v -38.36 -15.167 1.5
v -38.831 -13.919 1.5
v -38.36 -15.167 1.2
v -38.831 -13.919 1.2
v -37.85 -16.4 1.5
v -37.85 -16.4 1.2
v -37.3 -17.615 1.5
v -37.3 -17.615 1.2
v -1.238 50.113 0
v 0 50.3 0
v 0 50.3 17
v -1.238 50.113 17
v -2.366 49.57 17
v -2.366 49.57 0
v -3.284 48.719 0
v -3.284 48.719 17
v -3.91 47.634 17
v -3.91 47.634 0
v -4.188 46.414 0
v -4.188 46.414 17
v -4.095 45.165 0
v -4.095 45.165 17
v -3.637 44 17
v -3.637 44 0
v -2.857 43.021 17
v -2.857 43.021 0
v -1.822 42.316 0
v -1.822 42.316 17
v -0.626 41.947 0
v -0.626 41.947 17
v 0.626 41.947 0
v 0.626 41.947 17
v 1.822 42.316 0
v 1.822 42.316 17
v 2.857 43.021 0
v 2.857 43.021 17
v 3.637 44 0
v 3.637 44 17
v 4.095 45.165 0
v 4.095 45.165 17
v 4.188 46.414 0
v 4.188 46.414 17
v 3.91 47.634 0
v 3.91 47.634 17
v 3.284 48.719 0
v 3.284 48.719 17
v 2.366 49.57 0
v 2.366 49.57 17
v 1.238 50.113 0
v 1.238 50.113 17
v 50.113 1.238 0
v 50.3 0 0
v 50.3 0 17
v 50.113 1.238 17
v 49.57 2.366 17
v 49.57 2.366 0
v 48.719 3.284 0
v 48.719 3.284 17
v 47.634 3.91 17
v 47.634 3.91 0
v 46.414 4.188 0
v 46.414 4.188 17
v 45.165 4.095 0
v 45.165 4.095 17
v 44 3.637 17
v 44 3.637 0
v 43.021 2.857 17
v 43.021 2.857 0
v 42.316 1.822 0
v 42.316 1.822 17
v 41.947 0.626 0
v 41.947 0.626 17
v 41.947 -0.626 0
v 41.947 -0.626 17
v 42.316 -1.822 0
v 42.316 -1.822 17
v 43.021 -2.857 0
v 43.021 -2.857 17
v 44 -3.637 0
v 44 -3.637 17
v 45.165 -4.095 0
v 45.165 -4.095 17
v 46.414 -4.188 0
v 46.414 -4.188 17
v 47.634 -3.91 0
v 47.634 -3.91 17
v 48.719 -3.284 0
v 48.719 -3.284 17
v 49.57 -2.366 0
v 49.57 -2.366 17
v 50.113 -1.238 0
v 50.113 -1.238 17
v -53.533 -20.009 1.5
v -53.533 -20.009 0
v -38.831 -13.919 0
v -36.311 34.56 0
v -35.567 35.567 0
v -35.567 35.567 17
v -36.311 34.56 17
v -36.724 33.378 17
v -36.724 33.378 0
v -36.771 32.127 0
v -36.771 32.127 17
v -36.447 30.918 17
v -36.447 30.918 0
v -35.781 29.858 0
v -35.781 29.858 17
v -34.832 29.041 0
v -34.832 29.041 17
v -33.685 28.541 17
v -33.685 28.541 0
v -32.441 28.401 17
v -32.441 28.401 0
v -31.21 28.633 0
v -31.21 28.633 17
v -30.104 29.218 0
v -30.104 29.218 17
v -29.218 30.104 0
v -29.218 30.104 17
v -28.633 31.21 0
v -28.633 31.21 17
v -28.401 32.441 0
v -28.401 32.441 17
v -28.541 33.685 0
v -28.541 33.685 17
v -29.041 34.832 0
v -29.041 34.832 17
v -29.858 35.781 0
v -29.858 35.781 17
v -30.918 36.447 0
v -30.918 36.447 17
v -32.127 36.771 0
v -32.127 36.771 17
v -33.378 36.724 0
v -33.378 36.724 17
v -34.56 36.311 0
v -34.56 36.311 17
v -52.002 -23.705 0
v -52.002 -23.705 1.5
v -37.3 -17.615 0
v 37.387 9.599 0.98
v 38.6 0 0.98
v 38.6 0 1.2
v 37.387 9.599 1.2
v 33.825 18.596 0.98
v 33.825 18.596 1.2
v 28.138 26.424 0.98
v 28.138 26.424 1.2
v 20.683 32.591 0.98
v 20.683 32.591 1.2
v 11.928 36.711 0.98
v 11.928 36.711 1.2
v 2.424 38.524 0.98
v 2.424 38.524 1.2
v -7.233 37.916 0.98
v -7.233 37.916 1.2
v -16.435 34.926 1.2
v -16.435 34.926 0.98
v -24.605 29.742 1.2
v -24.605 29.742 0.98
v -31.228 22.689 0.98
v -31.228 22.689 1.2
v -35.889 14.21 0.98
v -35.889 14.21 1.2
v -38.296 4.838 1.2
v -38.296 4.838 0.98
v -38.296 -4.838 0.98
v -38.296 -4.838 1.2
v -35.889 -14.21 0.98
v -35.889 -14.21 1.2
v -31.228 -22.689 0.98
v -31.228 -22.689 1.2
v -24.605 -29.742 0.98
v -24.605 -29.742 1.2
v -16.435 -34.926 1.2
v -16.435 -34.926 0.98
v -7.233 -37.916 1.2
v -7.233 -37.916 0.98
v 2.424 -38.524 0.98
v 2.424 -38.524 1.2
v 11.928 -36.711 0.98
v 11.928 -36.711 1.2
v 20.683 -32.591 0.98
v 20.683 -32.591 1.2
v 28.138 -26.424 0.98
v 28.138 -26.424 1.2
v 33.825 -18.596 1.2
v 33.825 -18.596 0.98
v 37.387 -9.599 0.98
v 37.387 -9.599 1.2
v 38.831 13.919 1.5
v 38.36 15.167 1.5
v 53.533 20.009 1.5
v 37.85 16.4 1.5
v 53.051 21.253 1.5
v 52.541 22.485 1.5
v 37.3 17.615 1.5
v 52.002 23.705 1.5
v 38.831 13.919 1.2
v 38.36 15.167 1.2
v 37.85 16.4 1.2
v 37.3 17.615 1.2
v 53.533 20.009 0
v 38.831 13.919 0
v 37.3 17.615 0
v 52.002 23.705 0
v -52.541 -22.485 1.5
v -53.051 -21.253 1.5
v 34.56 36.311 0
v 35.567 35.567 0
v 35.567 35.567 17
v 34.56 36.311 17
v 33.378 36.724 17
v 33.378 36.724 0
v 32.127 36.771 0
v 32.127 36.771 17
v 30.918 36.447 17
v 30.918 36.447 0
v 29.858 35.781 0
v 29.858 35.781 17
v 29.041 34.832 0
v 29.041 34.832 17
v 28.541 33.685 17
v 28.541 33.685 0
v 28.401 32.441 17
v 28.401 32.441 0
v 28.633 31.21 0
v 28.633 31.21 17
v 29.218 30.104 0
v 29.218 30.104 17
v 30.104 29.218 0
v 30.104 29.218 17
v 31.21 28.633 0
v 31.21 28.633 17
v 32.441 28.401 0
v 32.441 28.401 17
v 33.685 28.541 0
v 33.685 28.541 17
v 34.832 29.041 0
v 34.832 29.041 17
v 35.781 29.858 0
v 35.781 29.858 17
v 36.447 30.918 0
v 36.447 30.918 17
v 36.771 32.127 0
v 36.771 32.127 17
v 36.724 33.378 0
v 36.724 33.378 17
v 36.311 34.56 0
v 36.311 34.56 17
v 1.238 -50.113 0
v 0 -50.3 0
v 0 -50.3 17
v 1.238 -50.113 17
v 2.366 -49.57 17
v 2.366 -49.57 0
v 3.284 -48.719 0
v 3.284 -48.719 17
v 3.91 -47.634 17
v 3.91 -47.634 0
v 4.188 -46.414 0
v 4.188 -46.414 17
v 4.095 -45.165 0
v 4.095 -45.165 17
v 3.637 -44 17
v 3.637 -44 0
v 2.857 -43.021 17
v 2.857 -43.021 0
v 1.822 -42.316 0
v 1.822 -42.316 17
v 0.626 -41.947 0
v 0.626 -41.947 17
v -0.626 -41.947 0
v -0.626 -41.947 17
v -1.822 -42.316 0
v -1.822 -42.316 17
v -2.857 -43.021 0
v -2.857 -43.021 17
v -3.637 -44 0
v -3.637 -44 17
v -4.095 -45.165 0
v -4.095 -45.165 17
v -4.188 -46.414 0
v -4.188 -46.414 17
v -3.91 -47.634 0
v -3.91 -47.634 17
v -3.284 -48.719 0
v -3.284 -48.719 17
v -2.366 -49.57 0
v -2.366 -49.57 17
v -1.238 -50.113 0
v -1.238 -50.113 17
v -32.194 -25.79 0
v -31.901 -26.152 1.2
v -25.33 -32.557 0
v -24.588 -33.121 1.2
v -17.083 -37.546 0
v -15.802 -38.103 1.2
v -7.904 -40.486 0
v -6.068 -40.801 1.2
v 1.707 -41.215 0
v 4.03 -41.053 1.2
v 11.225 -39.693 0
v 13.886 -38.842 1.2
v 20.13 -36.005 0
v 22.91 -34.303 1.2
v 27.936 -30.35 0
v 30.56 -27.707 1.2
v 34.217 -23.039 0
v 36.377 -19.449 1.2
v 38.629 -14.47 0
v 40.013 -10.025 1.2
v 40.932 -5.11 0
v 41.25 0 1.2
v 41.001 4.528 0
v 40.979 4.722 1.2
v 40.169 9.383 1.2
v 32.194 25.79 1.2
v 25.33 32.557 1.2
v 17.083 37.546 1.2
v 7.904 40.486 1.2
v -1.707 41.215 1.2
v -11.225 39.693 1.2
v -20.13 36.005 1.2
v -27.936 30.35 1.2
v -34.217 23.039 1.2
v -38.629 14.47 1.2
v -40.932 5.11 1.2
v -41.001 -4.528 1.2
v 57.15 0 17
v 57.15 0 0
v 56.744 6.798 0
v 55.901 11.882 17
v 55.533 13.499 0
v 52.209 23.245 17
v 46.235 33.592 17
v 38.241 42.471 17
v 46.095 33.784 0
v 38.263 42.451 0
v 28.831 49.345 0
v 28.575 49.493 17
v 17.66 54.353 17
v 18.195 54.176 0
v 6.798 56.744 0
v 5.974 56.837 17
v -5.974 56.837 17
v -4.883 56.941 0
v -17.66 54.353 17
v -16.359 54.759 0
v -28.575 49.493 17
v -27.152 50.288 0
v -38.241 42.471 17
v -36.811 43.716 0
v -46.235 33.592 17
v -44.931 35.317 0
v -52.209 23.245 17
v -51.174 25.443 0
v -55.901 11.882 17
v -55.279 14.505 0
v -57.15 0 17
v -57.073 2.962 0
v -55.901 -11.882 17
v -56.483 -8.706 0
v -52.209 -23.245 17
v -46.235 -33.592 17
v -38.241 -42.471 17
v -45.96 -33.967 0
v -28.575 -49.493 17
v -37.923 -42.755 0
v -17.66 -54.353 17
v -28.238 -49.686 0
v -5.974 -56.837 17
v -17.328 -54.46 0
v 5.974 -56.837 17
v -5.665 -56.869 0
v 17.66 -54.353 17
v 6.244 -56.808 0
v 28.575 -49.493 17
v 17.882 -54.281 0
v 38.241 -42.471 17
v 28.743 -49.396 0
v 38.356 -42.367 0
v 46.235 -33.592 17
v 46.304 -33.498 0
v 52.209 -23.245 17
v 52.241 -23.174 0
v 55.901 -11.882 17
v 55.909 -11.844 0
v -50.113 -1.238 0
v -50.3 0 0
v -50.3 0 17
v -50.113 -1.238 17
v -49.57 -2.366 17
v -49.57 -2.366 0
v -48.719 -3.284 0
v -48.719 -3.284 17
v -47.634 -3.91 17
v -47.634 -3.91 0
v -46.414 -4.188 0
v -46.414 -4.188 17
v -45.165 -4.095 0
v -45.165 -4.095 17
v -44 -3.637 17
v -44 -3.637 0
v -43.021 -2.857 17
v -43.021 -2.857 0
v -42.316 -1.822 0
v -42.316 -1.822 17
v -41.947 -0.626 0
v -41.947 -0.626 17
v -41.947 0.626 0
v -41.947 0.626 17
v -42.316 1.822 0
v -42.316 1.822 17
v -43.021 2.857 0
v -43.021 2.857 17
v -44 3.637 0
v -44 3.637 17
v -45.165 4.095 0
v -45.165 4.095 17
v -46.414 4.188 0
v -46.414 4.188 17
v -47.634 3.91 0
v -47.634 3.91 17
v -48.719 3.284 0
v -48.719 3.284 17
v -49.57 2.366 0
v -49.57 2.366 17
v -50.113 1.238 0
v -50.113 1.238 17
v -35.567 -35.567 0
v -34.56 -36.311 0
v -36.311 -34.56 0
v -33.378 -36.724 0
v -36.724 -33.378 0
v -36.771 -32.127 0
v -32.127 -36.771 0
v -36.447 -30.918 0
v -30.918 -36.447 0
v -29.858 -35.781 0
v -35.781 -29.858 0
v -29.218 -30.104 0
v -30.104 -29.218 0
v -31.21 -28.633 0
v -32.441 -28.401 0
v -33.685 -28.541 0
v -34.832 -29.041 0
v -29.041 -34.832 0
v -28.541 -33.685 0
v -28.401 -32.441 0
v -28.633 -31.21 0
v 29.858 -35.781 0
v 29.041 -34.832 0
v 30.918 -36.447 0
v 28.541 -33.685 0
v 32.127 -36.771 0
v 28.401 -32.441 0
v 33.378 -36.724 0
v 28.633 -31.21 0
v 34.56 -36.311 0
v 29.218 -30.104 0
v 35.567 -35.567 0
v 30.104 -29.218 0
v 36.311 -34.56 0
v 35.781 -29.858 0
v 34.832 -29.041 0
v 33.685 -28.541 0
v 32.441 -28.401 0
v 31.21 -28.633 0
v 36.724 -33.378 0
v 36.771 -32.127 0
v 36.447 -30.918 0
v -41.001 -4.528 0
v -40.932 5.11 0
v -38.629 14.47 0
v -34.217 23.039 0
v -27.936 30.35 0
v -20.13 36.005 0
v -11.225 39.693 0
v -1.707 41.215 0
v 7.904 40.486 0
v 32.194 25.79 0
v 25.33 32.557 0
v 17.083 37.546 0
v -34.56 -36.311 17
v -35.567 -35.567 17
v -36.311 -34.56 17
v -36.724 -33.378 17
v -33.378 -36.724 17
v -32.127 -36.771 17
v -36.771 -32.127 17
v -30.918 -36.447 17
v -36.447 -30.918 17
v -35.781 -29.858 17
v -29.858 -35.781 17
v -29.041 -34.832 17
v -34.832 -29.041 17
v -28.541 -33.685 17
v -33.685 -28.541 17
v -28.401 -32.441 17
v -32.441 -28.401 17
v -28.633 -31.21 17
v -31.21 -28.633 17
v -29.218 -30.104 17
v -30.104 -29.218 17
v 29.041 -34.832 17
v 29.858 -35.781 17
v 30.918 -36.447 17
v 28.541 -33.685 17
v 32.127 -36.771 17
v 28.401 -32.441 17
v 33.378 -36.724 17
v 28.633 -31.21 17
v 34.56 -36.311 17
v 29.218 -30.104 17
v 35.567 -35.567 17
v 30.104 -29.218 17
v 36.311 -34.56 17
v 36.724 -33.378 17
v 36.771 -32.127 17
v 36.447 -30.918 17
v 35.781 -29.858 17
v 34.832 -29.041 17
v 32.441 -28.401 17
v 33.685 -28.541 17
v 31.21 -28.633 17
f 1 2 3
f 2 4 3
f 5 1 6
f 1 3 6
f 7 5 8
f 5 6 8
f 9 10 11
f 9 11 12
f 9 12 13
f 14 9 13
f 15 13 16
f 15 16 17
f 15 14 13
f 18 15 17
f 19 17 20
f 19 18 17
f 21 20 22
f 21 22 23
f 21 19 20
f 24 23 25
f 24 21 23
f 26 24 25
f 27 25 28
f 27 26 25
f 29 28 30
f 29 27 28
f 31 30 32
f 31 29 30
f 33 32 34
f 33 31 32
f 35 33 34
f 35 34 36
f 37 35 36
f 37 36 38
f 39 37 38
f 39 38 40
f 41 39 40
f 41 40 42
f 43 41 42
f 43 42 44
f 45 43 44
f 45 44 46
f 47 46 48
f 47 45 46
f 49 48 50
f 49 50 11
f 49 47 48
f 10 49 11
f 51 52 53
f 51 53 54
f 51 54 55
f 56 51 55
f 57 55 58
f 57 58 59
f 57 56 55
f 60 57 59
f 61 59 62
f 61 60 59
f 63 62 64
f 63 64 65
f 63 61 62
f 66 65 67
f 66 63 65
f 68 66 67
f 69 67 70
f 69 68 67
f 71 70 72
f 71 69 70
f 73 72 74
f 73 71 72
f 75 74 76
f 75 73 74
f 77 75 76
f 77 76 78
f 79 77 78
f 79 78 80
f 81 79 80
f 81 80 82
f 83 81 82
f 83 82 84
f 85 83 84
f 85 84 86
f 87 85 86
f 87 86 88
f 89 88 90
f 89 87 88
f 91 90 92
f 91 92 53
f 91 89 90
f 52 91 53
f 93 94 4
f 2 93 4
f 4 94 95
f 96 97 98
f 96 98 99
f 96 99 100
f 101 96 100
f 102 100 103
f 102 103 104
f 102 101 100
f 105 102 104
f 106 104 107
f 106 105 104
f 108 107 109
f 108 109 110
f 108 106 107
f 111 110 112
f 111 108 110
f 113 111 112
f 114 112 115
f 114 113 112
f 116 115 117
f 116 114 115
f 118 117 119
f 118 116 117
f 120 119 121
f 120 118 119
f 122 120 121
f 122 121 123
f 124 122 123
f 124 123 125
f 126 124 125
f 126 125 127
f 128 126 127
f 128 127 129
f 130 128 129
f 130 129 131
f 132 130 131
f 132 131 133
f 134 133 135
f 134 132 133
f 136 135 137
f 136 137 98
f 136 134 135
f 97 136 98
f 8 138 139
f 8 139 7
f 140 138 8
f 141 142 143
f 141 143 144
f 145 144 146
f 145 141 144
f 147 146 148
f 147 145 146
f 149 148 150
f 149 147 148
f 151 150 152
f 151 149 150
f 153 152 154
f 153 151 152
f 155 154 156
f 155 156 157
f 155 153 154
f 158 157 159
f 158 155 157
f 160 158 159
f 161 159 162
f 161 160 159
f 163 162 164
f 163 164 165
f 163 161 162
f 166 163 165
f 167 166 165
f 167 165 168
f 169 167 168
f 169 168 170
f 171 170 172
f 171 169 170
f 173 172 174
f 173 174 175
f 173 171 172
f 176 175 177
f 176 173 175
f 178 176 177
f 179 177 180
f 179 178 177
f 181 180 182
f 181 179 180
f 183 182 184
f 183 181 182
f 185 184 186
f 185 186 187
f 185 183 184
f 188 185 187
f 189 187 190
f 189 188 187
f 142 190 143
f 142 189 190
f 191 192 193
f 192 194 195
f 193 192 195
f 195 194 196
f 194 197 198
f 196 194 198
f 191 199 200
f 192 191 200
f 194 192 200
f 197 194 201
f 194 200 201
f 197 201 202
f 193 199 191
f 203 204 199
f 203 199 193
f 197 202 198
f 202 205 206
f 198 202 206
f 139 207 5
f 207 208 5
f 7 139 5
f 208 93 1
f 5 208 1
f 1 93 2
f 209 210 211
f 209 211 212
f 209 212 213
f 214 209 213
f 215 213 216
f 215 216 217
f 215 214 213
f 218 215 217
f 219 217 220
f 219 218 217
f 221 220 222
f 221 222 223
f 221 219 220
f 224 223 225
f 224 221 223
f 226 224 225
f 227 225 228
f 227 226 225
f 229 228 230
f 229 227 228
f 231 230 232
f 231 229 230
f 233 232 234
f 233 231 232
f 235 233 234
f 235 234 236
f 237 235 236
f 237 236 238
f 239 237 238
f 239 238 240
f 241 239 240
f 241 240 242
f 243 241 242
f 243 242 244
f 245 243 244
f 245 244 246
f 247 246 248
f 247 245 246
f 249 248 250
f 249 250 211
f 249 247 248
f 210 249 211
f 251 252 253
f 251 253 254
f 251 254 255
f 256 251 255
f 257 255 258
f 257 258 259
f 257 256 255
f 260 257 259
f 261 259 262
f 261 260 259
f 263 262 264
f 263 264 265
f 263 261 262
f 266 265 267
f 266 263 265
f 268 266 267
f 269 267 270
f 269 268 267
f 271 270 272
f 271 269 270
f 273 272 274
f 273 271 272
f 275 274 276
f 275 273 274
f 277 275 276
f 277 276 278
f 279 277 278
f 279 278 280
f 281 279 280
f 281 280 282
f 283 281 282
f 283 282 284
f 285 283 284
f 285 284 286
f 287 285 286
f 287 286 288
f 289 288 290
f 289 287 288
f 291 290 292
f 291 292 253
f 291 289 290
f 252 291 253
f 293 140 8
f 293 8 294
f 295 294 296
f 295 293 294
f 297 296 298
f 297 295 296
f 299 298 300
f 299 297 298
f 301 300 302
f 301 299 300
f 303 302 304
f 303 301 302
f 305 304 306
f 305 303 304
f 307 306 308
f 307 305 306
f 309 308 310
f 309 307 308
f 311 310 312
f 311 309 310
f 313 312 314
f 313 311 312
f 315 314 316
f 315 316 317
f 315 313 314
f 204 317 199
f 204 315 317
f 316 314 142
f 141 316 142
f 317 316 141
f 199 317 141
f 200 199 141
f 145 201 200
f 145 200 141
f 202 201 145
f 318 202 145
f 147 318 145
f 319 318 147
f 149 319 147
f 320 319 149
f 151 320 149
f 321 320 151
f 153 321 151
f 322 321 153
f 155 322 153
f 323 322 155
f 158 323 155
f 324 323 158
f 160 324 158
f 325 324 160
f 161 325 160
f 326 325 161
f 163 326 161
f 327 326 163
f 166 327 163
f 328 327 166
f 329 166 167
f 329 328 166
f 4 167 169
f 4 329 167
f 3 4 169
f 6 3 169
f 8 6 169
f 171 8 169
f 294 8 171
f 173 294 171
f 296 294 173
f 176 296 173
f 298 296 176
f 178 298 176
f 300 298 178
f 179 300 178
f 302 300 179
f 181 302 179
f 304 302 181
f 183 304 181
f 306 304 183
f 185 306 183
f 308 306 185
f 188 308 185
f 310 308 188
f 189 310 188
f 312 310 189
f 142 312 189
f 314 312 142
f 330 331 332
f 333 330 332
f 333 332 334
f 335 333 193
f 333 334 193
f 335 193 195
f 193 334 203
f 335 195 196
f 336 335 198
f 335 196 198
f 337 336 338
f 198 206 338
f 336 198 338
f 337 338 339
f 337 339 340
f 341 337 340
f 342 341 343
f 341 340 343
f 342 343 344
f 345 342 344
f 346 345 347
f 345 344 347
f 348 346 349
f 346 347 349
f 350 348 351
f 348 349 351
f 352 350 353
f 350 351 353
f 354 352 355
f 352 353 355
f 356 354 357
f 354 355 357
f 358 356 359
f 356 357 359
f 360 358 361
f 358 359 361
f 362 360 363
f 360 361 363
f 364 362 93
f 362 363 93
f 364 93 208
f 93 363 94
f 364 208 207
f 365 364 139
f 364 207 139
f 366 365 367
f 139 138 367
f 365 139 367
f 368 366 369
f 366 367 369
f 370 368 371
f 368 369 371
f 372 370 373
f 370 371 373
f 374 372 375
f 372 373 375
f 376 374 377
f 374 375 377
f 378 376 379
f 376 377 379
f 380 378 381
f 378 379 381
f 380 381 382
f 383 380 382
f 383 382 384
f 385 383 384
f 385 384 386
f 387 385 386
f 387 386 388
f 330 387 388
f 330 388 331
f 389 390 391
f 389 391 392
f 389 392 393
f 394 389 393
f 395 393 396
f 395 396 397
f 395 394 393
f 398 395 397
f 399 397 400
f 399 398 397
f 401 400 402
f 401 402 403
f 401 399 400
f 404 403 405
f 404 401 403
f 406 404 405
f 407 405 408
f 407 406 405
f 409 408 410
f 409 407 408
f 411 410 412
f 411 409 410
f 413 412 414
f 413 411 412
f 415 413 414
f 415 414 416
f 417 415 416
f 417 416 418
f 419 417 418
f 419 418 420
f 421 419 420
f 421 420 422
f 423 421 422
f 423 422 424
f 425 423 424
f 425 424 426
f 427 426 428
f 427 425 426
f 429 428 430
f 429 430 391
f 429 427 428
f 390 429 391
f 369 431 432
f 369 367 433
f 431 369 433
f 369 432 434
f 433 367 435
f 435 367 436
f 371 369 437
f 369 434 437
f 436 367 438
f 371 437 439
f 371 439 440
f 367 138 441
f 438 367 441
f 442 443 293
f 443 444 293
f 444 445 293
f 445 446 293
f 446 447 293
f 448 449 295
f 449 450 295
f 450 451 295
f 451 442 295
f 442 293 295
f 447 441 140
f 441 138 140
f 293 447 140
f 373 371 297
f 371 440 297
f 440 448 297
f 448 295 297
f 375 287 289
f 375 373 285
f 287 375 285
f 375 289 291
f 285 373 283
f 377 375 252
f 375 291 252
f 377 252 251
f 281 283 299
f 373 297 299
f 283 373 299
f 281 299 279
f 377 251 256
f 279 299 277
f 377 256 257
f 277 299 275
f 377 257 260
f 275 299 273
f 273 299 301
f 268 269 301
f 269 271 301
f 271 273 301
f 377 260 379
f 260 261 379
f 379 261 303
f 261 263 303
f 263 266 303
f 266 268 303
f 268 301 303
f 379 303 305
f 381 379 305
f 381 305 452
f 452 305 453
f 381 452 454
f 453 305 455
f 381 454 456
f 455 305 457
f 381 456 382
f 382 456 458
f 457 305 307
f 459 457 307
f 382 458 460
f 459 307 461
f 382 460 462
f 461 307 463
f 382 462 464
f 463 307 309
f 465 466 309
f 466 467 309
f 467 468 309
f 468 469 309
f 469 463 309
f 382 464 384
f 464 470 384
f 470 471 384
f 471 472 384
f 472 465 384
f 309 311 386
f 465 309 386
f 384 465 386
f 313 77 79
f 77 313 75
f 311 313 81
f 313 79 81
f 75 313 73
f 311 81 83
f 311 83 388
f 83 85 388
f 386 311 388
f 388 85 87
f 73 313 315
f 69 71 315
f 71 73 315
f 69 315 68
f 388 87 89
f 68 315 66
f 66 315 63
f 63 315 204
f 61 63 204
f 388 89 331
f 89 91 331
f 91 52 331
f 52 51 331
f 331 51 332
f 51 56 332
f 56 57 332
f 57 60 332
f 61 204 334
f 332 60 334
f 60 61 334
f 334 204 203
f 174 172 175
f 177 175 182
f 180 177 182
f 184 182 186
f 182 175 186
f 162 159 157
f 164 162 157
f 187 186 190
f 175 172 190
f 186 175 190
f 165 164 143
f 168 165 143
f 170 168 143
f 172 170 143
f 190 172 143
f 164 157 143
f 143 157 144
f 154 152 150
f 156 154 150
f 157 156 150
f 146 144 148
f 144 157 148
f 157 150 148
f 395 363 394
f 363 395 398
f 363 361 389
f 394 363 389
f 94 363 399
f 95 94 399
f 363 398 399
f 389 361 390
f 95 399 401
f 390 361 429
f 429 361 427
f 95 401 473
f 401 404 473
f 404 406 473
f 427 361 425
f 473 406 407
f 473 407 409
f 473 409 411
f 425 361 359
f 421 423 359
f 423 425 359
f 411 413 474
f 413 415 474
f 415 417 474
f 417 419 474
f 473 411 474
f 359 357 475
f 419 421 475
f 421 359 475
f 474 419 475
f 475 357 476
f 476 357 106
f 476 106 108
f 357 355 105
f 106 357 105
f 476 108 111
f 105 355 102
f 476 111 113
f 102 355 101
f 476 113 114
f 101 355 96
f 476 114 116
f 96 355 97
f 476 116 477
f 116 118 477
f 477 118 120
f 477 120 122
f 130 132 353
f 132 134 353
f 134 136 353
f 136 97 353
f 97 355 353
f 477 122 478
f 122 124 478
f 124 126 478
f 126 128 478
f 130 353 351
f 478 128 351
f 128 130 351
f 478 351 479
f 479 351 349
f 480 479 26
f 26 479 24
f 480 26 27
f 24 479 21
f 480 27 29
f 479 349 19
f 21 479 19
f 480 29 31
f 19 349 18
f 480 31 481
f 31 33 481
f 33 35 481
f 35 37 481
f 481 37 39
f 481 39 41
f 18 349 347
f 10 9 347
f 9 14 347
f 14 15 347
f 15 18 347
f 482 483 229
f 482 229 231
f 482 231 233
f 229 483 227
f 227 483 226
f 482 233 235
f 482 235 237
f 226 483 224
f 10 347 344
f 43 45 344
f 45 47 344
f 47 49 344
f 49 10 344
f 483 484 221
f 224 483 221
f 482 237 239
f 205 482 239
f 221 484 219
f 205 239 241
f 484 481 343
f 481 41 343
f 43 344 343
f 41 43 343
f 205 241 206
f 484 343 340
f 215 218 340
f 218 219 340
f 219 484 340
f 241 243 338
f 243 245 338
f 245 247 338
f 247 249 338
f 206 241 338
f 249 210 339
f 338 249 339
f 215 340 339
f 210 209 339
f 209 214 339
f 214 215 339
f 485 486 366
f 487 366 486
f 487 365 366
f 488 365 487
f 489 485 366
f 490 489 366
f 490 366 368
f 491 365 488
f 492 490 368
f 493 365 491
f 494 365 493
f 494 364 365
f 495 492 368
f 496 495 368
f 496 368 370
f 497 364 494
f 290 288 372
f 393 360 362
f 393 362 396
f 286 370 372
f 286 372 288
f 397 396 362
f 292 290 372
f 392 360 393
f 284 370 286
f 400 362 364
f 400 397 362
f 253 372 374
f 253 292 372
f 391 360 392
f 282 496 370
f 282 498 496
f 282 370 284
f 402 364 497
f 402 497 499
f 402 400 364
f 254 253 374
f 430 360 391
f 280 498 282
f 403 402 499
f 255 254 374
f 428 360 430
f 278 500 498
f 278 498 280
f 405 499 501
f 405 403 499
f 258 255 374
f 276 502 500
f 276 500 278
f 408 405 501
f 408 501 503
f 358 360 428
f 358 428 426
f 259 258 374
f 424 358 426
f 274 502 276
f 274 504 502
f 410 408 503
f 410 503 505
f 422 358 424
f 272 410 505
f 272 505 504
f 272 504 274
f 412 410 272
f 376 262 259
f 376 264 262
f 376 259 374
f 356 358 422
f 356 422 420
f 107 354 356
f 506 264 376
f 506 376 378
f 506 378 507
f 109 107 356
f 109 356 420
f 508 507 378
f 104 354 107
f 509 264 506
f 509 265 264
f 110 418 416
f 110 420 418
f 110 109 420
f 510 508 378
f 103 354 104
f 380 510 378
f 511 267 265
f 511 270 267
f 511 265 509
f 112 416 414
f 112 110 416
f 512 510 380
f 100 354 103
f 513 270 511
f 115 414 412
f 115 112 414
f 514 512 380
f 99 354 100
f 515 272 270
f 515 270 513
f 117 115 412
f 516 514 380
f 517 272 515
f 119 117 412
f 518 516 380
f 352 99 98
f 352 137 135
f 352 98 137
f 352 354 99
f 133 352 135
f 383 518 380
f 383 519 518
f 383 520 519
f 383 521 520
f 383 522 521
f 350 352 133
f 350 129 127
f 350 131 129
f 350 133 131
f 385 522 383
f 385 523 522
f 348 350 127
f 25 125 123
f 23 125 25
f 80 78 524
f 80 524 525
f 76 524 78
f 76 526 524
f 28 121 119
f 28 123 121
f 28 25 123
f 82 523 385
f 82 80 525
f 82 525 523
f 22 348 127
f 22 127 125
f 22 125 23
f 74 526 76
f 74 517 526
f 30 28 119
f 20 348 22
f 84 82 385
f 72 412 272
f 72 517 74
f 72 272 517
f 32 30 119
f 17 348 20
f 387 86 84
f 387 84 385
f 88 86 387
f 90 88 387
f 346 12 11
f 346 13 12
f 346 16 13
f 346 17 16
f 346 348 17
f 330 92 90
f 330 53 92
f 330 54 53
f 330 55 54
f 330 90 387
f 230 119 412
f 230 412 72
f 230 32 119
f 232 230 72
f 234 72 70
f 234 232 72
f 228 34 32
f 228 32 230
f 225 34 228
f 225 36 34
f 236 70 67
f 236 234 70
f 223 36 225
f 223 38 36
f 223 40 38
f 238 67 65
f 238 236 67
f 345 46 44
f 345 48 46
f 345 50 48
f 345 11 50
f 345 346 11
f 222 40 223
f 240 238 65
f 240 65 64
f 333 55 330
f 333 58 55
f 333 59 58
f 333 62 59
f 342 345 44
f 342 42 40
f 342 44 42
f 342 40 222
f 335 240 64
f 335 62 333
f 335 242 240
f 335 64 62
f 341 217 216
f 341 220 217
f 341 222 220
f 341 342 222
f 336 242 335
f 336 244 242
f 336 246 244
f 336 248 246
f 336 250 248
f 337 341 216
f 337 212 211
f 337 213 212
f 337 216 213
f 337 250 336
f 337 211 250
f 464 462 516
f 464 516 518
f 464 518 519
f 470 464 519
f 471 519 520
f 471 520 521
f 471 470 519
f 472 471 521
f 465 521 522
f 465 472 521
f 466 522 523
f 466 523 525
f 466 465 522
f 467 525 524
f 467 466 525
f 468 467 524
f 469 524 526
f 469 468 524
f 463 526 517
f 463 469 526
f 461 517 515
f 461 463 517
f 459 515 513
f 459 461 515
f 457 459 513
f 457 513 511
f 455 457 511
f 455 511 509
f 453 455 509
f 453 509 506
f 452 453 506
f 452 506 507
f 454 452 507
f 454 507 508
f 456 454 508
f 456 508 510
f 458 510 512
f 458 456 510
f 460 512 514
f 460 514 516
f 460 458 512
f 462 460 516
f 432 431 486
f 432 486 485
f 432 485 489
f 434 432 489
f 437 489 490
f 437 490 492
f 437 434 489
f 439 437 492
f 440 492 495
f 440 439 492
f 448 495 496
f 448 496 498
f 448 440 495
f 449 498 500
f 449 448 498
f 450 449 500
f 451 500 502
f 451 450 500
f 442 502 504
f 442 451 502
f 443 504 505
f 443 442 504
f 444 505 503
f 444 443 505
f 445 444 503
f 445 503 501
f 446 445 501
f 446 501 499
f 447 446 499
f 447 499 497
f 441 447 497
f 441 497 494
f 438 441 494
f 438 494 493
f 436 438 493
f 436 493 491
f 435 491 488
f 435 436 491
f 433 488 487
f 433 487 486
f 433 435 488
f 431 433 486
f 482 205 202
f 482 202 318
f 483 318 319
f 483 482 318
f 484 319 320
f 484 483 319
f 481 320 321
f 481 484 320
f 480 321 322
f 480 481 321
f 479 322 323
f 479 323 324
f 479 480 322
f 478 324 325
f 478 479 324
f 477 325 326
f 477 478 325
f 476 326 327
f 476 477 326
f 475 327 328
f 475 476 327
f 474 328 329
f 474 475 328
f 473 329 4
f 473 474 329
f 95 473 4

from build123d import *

# Parameters (mm, degrees)
CYLINDER024_R             = 41.25
CYLINDER024_DEPTH         = 1.5
BOX_W                     = 16.9
BOX_H                     = 4
BOX_DEPTH                 = 1.5
BOX001_W                  = 16.9
BOX001_H                  = 4
BOX001_DEPTH              = 1.5
FUSION007_PLACEMENT_ANGLE = 22.5
CYLINDER003_R             = 4.2
CYLINDER003_DEPTH         = 17
ARRAY_COUNT               = 8
CYLINDER002_R             = 38.6
CYLINDER002_DEPTH         = 0.22
CYLINDER001_R             = 41.25
CYLINDER001_DEPTH         = 1.2
CYLINDER_R                = 57.15
CYLINDER_DEPTH            = 17


with BuildPart() as cylinder024:
    # Cylinder024 → Cylinder024 (new body)
    with BuildSketch(Plane.XY):
        Circle(CYLINDER024_R)
    extrude(amount=CYLINDER024_DEPTH)


with BuildPart() as cube:
    # Box → Box (new body)
    with BuildSketch(Plane(origin=(40.75, -2, 0), x_dir=(1, 0, 0), z_dir=(0, 0, 1))):
        with Locations((8.45, 2)):
            Rectangle(BOX_W, BOX_H)
    extrude(amount=BOX_DEPTH)


with BuildPart() as leaktestgrooves01:
    # Box001 → Box001 (new body)
    with BuildSketch(Plane(origin=(-57.65, -2, 0), x_dir=(1, 0, 0), z_dir=(0, 0, 1))):
        with Locations((8.45, 2)):
            Rectangle(BOX001_W, BOX001_H)
    extrude(amount=BOX001_DEPTH)

    # Fusion007: union Cube
    add(cube.part)


with BuildPart() as leaktestgrooves01_1:
    # Fusion007 placement: moved
    add(leaktestgrooves01.part.rotate(Axis((0, 0, 0), (0, 0, 1)), FUSION007_PLACEMENT_ANGLE))

    # Cut019: cut Cylinder024
    add(cylinder024.part, mode=Mode.SUBTRACT)


with BuildPart() as boltholearray:
    # Cylinder003 → Cylinder003 (new body)
    with BuildSketch(Plane(origin=(46.1, 0, 0), x_dir=(1, 0, 0), z_dir=(0, 0, 1))):
        Circle(CYLINDER003_R)
    extrude(amount=CYLINDER003_DEPTH)

    # Array: BoltHoleArray ×8 about axis
    array_axis = Axis((0, 0, 0), (0, 0, 1))


with BuildPart() as boltholearray_1:
    add(boltholearray.part)
    for i in range(1, ARRAY_COUNT):
        add(boltholearray.part.rotate(array_axis, i * 360 / ARRAY_COUNT))


with BuildPart() as cylinder:
    # Cylinder002 → Cylinder002 (new body)
    with BuildSketch(Plane.XY):
        Circle(CYLINDER002_R)
    extrude(amount=CYLINDER002_DEPTH)


with BuildPart() as knifeedge:
    # Cone → Cone (revolve)
    with BuildSketch(Plane.XZ):
        Polygon((0, 0), (38.6, 0), (41.25, 0.22), (0, 0.22), align=None)
    revolve(axis=Axis((0, 0, 0), (0, 0, 1)))

    # Cut001: cut Cylinder
    add(cylinder.part, mode=Mode.SUBTRACT)


with BuildPart() as knifeedge_1:
    # Cut001 placement: moved
    add(knifeedge.part.moved(Location((0, 0, 0.98))))


with BuildPart() as sealrecess:
    # Cylinder001 → Cylinder001 (new body)
    with BuildSketch(Plane.XY):
        Circle(CYLINDER001_R)
    extrude(amount=CYLINDER001_DEPTH)


with BuildPart() as blankflange_nonrotatable:
    # Cylinder → Cylinder (new body)
    with BuildSketch(Plane.XY):
        Circle(CYLINDER_R)
    extrude(amount=CYLINDER_DEPTH)

    # Cut: cut SealRecess
    add(sealrecess.part, mode=Mode.SUBTRACT)

    # Fusion: union KnifeEdge
    add(knifeedge_1.part)

    # Cut002: cut BoltHoleArray
    add(boltholearray_1.part, mode=Mode.SUBTRACT)

    # Cut020: cut LeakTestGrooves01
    add(leaktestgrooves01_1.part, mode=Mode.SUBTRACT)


solid = blankflange_nonrotatable.part
